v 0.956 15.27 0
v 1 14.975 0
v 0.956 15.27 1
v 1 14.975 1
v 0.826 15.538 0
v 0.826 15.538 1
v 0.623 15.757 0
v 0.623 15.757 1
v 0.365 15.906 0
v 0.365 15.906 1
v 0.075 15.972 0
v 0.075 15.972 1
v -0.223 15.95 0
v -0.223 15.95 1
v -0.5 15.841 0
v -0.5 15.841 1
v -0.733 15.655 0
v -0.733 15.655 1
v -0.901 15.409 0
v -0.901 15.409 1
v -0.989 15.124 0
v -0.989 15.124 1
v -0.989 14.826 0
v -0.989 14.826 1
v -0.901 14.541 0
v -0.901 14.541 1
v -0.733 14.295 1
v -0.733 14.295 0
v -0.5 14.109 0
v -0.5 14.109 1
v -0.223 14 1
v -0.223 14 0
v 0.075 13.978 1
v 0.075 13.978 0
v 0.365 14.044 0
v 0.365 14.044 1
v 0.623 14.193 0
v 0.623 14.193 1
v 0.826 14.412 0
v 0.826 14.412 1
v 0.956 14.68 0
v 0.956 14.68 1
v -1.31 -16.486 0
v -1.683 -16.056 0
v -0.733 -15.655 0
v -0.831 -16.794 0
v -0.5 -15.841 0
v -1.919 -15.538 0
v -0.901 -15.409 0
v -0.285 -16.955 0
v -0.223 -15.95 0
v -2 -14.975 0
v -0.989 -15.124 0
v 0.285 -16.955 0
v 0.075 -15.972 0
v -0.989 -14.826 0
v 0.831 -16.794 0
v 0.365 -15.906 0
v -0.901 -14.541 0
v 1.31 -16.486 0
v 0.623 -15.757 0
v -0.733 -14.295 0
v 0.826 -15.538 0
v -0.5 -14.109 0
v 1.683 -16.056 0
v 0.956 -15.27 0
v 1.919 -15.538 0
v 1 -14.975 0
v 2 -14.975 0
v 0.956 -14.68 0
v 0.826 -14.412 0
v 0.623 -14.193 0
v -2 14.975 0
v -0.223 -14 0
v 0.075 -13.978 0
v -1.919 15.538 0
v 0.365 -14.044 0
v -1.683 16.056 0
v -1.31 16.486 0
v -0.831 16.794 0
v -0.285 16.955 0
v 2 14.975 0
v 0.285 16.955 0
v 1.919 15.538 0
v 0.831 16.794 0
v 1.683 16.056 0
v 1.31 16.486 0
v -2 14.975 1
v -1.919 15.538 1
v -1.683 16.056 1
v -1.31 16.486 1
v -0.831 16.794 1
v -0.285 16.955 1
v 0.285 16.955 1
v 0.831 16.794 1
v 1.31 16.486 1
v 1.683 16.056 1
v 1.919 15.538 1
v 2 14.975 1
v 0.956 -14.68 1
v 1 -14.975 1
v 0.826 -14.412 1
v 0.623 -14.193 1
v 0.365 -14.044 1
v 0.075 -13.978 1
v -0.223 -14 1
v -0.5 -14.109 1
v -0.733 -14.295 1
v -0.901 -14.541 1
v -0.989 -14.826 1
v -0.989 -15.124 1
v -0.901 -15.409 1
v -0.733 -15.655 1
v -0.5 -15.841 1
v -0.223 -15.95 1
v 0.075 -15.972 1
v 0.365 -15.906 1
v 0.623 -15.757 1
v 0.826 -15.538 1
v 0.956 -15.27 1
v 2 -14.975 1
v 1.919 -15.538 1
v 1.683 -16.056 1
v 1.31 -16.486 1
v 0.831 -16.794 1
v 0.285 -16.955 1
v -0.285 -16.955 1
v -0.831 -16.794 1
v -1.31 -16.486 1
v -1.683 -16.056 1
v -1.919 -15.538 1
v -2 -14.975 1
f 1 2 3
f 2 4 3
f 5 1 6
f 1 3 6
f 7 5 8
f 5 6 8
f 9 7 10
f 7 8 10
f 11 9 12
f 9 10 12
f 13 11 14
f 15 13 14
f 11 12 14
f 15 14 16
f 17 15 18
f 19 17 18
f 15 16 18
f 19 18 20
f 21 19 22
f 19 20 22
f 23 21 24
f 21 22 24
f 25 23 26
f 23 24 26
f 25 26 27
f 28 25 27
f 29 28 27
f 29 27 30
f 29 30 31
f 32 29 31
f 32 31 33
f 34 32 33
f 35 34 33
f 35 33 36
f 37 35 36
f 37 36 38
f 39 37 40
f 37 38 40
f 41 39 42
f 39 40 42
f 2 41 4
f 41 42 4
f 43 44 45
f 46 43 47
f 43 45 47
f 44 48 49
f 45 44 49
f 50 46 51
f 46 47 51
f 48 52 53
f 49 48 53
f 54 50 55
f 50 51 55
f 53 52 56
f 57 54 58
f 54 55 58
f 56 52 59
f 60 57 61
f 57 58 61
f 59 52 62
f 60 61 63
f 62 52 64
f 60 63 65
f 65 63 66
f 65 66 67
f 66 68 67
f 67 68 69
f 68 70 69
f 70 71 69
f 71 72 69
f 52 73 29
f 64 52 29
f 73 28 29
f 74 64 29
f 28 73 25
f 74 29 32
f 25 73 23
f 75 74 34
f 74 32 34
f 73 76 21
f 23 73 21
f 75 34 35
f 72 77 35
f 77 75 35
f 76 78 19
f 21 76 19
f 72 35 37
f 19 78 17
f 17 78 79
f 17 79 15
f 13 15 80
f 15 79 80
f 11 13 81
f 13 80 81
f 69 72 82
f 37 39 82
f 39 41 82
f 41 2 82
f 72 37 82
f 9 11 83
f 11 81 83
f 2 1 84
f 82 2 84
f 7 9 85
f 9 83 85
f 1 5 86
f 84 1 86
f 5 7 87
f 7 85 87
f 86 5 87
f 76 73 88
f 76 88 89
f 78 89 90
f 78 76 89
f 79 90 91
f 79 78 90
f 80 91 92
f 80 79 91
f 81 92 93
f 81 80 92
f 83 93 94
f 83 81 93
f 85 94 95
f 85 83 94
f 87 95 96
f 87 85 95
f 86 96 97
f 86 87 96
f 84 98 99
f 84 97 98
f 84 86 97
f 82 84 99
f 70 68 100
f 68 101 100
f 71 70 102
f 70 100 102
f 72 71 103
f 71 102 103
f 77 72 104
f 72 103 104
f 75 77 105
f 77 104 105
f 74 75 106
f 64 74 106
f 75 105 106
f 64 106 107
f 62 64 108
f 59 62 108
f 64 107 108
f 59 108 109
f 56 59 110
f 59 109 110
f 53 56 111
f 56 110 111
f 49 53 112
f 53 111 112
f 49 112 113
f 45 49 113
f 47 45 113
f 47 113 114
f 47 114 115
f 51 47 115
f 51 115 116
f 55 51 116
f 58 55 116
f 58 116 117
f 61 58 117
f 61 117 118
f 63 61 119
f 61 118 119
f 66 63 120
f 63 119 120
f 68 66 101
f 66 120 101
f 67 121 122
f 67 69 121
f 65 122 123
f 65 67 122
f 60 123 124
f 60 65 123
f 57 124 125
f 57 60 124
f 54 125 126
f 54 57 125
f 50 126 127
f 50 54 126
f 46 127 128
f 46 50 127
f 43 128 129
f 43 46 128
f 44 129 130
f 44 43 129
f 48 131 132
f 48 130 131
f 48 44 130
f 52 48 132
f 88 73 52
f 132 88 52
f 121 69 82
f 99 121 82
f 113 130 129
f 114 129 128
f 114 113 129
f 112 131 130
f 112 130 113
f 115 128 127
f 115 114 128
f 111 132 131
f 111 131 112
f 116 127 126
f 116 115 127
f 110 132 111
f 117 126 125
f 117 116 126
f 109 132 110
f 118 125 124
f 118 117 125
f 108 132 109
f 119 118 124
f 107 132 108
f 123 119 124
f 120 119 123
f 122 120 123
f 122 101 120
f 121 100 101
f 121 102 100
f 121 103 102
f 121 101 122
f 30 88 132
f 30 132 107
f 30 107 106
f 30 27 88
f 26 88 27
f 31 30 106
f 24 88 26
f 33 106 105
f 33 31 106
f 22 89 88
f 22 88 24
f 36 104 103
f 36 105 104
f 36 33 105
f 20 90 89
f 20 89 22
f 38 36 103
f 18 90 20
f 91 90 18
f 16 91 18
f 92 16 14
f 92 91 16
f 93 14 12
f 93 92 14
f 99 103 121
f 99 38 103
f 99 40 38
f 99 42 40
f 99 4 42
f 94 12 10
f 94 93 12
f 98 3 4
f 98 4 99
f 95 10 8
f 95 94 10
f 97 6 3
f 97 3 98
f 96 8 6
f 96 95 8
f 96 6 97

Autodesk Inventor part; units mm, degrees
ref_plane "YZ Plane" through (0, 0, 0) normal (1, 0, 0) x (0, 1, 0)
ref_plane "XZ Plane" through (0, 0, 0) normal (0, 1, 0) x (-1, 0, 0)
ref_plane "XY Plane" through (0, 0, 0) normal (0, 0, 1) x (1, 0, 0)
sketch "草圖1" plane through (0, 0, 0) normal (0, 0, 1) x (1, 0, 0)
  line L0 (0, -14.975) -> (0, 14.975) construction
  line L1 (2, -14.975) -> (2, 14.975)
  line L2 (-2, 14.975) -> (-2, -14.975)
  arc A0 (-2, -14.975) -> (2, -14.975) centre (0, -14.975) ccw
  arc A1 (2, 14.975) -> (-2, 14.975) centre (0, 14.975) ccw
  point P0 (0, 0)
  dimension "d0" = 29.95
  dimension "d1" = 4
extrude "擠出1" add sketch "草圖1" along normal blind 1
sketch "草圖2" plane through (0, 0, 1) normal (0, 0, 1) x (1, 0, 0)
  arc A0 (2, 14.975) -> (-2, 14.975) centre (0, 14.975) ccw projected
  circle A1 centre (0, 14.975) radius 0.75
  arc A2 (-2, -14.975) -> (2, -14.975) centre (0, -14.975) ccw projected
  circle A3 centre (0, -14.975) radius 0.75
  point P0 (0, 0)
  dimension "d6" = 1.5
  dimension "d7" = 1.5
extrude "擠出2" add sketch "草圖2" along normal blind 1
sketch "草圖3" plane through (0, 0, 1) normal (0, 0, 1) x (1, 0, 0)
  circle A0 centre (0, 14.975) radius 0.75 projected
  circle A1 centre (0, 14.975) radius 1
  circle A2 centre (0, -14.975) radius 0.75 projected
  circle A3 centre (0, -14.975) radius 1
  point P0 (0, 0)
  dimension "d10" = 2
  dimension "d11" = 2
extrude "擠出3" cut sketch "草圖3" along normal mid plane 10 contours A0 | A1 | A2 | A3
properties part number "連桿1"
